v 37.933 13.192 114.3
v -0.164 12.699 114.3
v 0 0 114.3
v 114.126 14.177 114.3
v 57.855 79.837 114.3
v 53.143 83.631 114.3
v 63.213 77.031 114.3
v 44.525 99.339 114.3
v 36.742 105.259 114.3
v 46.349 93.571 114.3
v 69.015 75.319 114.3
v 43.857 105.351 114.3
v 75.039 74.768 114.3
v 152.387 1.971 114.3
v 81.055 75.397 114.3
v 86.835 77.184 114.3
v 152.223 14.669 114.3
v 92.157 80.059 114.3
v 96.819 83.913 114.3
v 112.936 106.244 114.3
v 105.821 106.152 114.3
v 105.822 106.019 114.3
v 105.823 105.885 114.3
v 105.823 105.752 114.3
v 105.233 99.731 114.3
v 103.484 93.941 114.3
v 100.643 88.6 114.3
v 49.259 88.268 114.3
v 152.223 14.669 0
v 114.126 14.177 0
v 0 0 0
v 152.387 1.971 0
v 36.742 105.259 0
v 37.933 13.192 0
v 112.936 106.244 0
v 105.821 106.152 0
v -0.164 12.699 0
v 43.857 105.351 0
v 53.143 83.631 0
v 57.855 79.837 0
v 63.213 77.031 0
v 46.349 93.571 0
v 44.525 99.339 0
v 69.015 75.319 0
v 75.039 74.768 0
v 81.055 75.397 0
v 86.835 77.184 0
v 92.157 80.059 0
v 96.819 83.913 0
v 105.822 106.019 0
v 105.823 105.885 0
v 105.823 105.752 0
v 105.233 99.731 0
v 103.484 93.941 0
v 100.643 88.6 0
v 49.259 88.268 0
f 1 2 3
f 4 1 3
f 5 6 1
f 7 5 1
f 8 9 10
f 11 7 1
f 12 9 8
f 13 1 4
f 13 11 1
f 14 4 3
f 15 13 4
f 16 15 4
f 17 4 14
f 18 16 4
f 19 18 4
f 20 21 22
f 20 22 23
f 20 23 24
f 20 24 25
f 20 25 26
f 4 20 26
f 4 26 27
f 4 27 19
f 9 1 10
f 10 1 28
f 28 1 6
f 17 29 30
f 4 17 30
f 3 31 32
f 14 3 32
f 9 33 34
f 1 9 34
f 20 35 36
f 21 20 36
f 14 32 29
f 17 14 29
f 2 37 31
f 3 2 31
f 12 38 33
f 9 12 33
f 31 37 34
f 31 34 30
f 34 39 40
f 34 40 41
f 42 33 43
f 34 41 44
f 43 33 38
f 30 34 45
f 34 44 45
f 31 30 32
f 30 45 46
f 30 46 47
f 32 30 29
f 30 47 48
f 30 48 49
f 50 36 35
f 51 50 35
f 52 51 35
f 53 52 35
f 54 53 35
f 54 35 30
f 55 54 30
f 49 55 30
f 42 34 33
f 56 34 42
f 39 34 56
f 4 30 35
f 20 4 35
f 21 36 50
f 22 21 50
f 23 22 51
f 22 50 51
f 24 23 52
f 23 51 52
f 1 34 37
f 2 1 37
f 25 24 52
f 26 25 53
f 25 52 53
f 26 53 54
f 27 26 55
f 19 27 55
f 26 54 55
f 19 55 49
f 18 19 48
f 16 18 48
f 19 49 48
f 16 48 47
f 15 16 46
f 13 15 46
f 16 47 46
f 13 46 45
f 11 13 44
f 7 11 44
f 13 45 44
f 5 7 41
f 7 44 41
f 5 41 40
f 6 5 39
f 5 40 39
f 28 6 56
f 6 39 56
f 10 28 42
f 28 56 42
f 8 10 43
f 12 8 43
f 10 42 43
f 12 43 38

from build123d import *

# Parameters (mm, degrees)
F1_DEPTH = 114.3


with BuildPart() as f1:
    # F0 (on Top) → F1 (new body)
    with BuildSketch(Plane.XY):
        with BuildLine():
            Line((0, 0), (152.38726, 1.970525))
            Line((152.38726, 1.970525), (152.22305, 14.669463))
            Line((152.22305, 14.669463), (114.126235, 14.176832))
            Line((114.126235, 14.176832), (112.935709, 106.244135))
            Line((112.935709, 106.244135), (105.82064, 106.15213))
            ThreePointArc((105.82064, 106.15213), (105.822583, 105.951821), (105.82323, 105.751504))
            ThreePointArc((105.82323, 105.751504), (75.039211, 74.767815), (43.857148, 105.350878))
            Line((43.857148, 105.350878), (36.742079, 105.258873))
            Line((36.742079, 105.258873), (37.932605, 13.19157))
            Line((37.932605, 13.19157), (-0.16421, 12.698938))
            Line((-0.16421, 12.698938), (0, 0))
        make_face()
    extrude(amount=F1_DEPTH)


solid = f1.part
